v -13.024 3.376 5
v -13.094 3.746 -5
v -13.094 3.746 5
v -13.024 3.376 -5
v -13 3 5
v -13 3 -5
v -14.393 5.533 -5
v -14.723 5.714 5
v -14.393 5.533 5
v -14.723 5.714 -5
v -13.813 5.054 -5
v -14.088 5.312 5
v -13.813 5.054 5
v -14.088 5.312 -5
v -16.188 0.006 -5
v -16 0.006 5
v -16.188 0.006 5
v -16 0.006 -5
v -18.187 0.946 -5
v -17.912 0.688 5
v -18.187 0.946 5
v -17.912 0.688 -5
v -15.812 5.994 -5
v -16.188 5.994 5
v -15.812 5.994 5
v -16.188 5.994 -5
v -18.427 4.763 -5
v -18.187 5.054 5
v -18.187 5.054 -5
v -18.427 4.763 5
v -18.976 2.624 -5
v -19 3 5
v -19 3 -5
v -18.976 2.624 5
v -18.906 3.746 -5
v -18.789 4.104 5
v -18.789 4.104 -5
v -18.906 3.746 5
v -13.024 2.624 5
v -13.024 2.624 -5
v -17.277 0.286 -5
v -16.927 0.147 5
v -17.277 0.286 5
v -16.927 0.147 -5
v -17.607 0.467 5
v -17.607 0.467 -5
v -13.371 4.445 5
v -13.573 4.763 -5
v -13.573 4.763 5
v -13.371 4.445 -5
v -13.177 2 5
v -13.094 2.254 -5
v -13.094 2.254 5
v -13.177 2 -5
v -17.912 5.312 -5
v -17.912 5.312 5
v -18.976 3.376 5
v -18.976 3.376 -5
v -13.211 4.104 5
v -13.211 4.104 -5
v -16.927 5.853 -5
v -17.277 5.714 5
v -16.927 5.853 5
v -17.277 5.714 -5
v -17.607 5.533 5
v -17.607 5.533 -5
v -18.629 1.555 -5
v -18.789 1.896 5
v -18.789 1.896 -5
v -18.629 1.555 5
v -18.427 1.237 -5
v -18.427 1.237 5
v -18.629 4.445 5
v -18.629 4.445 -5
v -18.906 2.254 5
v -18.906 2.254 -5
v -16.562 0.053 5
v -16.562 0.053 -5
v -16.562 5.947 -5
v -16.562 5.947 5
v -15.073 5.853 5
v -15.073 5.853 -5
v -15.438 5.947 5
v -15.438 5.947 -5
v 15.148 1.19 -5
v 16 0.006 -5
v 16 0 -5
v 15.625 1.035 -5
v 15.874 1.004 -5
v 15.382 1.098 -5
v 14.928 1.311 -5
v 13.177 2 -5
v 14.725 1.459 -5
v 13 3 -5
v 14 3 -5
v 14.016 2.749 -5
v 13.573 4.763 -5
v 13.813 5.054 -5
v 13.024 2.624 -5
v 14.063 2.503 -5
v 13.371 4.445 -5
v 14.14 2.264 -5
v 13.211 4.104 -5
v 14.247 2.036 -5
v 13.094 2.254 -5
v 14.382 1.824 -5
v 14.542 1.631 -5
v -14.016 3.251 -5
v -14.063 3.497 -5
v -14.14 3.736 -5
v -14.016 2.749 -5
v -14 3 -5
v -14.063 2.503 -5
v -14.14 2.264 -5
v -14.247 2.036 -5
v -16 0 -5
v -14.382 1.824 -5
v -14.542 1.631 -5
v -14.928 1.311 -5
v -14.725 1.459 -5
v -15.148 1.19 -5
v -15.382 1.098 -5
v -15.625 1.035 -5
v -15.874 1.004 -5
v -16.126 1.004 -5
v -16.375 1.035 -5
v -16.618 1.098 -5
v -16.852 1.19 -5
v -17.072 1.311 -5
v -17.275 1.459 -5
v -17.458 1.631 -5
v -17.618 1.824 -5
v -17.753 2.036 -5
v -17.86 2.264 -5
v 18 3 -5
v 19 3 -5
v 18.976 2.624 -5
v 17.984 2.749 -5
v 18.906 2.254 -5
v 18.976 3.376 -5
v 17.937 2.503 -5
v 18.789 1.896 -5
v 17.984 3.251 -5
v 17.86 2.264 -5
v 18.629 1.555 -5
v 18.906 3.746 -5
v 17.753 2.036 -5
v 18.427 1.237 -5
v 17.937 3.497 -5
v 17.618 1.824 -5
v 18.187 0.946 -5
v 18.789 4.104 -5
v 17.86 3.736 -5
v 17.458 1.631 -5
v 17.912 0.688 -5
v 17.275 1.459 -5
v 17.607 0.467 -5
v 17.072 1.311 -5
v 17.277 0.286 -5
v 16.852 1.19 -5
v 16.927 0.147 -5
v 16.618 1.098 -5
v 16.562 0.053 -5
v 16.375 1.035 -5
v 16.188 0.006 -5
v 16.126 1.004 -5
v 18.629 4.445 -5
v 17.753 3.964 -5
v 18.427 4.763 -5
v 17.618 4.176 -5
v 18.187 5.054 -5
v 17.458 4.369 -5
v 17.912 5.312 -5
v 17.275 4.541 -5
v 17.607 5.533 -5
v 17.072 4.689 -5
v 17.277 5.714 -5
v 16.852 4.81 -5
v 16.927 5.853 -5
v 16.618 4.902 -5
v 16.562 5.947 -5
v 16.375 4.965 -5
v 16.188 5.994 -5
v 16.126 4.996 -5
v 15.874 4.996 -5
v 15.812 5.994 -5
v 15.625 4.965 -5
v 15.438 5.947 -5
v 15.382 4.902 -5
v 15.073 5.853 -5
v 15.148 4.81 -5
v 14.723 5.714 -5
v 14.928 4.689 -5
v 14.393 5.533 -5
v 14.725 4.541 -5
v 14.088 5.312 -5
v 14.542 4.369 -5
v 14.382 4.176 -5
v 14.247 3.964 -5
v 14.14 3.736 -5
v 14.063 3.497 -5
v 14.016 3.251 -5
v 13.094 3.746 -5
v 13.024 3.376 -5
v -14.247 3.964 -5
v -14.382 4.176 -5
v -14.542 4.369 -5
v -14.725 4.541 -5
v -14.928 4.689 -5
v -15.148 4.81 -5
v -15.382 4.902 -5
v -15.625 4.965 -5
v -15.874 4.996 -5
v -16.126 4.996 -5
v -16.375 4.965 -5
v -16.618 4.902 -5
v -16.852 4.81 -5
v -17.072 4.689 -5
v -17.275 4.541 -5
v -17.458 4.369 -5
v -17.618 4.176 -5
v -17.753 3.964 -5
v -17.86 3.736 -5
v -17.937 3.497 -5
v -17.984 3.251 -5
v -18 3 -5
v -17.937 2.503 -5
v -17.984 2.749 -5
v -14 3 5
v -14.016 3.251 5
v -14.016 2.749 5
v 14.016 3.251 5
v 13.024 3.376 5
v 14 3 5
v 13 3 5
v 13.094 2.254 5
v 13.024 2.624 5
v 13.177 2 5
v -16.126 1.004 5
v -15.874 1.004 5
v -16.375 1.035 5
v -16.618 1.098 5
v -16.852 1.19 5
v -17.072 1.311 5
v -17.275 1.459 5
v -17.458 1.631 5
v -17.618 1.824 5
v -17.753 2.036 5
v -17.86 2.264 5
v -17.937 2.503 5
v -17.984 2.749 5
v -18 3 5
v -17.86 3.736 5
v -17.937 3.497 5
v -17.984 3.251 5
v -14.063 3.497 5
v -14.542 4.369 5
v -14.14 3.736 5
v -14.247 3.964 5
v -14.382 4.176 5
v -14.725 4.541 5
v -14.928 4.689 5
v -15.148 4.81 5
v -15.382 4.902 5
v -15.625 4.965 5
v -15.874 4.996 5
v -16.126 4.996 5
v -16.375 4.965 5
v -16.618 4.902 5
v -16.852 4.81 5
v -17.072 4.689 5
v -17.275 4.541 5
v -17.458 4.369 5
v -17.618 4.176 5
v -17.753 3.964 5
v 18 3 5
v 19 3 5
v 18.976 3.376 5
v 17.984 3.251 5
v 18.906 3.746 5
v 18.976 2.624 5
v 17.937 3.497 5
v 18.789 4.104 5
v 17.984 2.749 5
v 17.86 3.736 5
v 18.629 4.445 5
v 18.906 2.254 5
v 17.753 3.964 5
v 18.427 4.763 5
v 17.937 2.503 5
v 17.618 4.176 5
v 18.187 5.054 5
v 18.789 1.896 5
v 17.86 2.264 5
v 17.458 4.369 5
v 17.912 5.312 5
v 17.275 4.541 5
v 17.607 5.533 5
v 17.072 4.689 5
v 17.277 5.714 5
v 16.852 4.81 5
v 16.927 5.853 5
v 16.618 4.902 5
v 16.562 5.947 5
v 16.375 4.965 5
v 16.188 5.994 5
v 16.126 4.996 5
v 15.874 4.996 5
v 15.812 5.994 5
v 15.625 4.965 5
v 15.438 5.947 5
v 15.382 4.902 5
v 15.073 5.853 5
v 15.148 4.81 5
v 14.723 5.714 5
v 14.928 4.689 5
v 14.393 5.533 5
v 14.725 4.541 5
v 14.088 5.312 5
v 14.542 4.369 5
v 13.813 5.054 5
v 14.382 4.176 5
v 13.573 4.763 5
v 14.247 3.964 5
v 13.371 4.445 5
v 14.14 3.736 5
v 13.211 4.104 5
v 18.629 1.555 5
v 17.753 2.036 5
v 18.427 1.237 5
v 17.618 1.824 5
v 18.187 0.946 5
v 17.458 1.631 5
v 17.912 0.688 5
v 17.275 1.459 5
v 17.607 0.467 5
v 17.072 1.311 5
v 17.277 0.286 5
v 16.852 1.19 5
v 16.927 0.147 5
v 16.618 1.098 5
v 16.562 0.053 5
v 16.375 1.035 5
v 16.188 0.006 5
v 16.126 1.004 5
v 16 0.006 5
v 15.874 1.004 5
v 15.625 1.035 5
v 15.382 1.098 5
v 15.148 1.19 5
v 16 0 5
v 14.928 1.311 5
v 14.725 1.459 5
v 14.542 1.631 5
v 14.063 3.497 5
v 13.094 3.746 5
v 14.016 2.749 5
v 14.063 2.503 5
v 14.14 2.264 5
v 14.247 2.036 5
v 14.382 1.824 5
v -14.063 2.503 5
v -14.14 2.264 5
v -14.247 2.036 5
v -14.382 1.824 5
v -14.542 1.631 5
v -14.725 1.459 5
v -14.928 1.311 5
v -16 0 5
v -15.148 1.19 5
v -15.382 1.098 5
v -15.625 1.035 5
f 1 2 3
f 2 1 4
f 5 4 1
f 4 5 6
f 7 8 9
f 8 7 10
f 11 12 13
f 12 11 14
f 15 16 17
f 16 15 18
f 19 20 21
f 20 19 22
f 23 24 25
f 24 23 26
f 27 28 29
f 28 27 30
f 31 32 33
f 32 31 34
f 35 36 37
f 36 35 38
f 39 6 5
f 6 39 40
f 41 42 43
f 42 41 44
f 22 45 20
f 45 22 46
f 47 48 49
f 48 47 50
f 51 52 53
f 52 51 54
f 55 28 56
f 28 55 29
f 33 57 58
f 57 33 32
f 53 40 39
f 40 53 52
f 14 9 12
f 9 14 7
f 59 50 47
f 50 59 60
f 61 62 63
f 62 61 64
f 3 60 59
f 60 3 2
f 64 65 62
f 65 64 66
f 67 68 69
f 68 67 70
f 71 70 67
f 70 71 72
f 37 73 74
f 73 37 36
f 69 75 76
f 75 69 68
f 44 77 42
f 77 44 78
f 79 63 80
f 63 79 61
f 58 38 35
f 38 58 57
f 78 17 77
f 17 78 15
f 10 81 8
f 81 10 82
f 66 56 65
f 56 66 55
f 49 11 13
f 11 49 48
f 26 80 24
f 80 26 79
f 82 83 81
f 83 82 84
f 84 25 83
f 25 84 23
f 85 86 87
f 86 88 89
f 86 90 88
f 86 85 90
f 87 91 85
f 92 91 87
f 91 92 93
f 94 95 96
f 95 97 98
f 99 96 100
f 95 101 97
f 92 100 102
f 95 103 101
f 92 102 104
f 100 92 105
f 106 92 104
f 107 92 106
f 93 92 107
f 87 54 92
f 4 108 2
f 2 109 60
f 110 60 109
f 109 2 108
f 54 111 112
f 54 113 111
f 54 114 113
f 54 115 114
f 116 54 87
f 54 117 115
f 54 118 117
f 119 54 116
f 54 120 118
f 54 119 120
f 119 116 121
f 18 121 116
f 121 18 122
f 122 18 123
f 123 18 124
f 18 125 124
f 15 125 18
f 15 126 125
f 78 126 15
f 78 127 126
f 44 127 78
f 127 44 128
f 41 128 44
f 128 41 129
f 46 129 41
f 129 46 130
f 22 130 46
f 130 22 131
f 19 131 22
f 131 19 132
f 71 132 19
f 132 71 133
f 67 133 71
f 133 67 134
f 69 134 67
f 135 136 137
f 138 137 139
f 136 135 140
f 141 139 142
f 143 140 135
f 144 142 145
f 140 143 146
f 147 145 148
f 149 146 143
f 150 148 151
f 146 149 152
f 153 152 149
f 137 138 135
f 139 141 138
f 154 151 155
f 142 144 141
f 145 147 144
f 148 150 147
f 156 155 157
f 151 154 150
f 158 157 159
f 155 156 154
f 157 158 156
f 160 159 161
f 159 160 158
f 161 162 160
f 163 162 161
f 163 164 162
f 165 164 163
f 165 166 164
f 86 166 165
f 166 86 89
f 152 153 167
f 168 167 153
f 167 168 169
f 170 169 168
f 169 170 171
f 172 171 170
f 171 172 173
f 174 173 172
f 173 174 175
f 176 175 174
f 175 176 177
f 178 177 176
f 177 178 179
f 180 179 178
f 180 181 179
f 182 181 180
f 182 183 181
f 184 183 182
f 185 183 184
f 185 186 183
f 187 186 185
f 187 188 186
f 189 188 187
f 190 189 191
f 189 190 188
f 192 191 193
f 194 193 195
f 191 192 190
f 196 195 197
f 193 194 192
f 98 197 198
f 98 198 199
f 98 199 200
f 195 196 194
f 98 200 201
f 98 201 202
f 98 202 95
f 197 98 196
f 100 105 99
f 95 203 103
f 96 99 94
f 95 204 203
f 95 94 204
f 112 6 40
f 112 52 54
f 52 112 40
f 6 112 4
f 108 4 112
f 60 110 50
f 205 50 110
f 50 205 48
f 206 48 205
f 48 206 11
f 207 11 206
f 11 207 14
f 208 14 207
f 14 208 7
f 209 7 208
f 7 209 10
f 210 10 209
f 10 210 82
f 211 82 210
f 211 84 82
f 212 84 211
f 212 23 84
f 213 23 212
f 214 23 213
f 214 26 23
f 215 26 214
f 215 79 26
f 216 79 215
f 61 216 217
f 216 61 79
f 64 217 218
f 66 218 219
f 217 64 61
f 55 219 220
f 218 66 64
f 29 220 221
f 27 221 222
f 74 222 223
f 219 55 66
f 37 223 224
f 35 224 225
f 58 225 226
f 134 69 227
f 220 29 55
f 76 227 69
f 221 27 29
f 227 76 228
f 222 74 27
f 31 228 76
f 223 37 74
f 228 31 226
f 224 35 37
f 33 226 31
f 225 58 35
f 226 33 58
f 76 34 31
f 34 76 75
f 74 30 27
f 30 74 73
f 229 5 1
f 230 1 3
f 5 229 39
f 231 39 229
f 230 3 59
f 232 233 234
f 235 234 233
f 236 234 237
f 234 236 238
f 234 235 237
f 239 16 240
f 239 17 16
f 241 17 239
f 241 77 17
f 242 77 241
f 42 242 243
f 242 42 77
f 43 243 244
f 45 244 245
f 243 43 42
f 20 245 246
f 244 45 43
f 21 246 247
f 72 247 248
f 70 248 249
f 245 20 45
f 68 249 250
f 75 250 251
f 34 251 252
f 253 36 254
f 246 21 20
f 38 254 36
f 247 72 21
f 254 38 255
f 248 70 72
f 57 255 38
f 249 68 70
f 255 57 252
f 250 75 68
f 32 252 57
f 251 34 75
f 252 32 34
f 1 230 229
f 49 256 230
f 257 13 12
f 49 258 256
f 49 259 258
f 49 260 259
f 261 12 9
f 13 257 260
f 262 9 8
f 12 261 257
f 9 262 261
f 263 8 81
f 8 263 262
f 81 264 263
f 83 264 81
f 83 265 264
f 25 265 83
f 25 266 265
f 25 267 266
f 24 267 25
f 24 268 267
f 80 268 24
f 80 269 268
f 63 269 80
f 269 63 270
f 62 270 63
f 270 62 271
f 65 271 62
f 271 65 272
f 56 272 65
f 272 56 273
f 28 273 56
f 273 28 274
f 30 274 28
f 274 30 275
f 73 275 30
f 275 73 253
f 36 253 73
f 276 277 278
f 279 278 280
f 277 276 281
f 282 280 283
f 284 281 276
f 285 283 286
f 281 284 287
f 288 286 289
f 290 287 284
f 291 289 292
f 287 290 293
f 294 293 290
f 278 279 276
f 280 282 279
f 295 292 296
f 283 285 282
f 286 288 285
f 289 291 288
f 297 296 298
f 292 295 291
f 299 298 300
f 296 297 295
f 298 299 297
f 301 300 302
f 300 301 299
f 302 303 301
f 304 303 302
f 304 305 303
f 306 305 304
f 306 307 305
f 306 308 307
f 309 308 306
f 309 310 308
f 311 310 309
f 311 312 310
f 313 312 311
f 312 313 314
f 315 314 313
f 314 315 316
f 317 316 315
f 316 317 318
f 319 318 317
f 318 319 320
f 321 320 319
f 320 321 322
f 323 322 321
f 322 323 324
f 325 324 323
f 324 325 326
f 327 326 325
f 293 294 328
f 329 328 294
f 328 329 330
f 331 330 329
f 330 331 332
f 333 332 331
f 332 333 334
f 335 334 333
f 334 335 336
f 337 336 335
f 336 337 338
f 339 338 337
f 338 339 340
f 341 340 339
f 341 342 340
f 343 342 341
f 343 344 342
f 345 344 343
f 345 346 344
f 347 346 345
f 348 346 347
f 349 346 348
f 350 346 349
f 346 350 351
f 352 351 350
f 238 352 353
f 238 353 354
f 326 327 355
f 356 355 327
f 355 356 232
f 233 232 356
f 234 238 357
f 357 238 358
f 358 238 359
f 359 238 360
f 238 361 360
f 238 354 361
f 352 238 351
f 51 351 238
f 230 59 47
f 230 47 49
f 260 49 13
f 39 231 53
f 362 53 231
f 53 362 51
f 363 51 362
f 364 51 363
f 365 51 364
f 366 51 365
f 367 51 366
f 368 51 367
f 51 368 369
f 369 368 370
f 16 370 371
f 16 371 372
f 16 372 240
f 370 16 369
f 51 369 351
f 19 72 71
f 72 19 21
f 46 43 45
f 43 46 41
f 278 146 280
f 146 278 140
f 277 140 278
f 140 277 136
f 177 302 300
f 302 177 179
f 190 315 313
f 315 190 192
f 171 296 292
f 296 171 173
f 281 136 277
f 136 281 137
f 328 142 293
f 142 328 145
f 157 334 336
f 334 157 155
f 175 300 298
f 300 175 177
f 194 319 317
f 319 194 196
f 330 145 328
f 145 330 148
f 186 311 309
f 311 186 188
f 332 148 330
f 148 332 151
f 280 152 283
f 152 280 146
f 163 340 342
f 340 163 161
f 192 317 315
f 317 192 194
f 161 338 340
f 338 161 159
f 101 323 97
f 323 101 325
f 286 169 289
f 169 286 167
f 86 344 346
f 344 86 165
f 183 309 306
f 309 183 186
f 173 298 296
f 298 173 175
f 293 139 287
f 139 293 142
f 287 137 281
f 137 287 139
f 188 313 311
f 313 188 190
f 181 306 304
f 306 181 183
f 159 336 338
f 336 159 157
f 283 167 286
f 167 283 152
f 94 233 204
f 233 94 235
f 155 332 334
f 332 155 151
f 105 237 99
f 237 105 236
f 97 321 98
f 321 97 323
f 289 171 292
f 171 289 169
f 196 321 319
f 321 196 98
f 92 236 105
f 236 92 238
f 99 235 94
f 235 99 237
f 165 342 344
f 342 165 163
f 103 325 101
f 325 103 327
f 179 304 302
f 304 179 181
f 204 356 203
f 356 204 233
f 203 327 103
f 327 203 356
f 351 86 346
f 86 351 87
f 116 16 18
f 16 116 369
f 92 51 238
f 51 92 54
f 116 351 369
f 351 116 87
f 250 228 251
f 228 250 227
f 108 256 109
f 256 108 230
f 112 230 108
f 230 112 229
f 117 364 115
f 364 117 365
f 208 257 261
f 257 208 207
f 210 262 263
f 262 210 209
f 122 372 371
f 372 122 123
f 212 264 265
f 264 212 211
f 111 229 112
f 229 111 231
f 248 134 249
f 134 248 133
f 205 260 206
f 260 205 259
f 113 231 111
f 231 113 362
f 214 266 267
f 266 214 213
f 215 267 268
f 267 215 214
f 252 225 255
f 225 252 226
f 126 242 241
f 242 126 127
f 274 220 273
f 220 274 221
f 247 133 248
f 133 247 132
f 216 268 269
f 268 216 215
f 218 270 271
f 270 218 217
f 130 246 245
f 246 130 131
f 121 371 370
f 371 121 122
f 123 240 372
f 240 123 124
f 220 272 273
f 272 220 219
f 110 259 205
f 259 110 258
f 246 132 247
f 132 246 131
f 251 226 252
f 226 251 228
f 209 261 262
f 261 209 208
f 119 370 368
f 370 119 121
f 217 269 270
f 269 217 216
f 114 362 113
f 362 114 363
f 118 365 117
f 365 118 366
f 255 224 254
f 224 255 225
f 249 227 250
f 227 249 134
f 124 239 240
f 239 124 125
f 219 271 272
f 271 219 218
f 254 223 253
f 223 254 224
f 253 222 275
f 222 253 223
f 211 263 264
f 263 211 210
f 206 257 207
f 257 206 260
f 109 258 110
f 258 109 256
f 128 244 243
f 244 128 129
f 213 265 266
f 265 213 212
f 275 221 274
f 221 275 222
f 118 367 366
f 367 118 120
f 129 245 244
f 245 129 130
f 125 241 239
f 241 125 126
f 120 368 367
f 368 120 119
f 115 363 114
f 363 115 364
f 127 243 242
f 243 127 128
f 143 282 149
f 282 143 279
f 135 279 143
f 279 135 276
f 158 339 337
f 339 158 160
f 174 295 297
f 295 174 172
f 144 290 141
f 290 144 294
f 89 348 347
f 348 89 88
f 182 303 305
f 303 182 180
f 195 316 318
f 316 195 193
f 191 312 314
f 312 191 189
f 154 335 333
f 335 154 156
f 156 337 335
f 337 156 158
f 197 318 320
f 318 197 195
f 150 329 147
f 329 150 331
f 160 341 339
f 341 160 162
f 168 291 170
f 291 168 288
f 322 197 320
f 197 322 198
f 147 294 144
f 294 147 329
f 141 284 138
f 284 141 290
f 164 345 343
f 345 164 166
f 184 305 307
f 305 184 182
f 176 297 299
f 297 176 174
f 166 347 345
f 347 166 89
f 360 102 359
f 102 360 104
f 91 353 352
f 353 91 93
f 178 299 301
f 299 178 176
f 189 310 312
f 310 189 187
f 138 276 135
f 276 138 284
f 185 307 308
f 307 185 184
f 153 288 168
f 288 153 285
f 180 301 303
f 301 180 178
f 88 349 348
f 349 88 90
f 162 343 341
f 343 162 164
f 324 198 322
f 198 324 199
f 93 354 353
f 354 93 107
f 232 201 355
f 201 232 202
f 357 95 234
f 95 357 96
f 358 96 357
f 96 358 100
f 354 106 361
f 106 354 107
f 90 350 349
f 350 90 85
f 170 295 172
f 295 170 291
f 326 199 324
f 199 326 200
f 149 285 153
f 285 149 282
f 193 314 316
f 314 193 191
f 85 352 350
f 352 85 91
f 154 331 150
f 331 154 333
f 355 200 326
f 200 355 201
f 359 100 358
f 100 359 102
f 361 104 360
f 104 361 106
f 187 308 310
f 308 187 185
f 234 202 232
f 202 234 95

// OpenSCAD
spacerDiameter = 4;
spacerWidth = 32;
spacerThickness = 1;
wallThickness = 2;
wallHeight = 10;


difference() {
	union() {
		translate([0,wallThickness/2,0])
		cube([spacerWidth,wallThickness,wallHeight],center=true);

		SpacerWrapper();
	}
	SpacerHole();
}

module SpacerWrapper() {
	for (xPos = [-spacerWidth/2, spacerWidth/2]) {
		translate([xPos,(spacerDiameter+spacerThickness*2)/2,0])
		cylinder(d=spacerDiameter+spacerThickness*2,h=wallHeight,$fn=50,center=true);
	}
}
module SpacerHole() {
	for (xPos = [-spacerWidth/2, spacerWidth/2]) {
		translate([xPos,(spacerDiameter+spacerThickness*2)/2,0])
		cylinder(d=spacerDiameter,h=wallHeight+2,$fn=50,center=true);
	}
}
